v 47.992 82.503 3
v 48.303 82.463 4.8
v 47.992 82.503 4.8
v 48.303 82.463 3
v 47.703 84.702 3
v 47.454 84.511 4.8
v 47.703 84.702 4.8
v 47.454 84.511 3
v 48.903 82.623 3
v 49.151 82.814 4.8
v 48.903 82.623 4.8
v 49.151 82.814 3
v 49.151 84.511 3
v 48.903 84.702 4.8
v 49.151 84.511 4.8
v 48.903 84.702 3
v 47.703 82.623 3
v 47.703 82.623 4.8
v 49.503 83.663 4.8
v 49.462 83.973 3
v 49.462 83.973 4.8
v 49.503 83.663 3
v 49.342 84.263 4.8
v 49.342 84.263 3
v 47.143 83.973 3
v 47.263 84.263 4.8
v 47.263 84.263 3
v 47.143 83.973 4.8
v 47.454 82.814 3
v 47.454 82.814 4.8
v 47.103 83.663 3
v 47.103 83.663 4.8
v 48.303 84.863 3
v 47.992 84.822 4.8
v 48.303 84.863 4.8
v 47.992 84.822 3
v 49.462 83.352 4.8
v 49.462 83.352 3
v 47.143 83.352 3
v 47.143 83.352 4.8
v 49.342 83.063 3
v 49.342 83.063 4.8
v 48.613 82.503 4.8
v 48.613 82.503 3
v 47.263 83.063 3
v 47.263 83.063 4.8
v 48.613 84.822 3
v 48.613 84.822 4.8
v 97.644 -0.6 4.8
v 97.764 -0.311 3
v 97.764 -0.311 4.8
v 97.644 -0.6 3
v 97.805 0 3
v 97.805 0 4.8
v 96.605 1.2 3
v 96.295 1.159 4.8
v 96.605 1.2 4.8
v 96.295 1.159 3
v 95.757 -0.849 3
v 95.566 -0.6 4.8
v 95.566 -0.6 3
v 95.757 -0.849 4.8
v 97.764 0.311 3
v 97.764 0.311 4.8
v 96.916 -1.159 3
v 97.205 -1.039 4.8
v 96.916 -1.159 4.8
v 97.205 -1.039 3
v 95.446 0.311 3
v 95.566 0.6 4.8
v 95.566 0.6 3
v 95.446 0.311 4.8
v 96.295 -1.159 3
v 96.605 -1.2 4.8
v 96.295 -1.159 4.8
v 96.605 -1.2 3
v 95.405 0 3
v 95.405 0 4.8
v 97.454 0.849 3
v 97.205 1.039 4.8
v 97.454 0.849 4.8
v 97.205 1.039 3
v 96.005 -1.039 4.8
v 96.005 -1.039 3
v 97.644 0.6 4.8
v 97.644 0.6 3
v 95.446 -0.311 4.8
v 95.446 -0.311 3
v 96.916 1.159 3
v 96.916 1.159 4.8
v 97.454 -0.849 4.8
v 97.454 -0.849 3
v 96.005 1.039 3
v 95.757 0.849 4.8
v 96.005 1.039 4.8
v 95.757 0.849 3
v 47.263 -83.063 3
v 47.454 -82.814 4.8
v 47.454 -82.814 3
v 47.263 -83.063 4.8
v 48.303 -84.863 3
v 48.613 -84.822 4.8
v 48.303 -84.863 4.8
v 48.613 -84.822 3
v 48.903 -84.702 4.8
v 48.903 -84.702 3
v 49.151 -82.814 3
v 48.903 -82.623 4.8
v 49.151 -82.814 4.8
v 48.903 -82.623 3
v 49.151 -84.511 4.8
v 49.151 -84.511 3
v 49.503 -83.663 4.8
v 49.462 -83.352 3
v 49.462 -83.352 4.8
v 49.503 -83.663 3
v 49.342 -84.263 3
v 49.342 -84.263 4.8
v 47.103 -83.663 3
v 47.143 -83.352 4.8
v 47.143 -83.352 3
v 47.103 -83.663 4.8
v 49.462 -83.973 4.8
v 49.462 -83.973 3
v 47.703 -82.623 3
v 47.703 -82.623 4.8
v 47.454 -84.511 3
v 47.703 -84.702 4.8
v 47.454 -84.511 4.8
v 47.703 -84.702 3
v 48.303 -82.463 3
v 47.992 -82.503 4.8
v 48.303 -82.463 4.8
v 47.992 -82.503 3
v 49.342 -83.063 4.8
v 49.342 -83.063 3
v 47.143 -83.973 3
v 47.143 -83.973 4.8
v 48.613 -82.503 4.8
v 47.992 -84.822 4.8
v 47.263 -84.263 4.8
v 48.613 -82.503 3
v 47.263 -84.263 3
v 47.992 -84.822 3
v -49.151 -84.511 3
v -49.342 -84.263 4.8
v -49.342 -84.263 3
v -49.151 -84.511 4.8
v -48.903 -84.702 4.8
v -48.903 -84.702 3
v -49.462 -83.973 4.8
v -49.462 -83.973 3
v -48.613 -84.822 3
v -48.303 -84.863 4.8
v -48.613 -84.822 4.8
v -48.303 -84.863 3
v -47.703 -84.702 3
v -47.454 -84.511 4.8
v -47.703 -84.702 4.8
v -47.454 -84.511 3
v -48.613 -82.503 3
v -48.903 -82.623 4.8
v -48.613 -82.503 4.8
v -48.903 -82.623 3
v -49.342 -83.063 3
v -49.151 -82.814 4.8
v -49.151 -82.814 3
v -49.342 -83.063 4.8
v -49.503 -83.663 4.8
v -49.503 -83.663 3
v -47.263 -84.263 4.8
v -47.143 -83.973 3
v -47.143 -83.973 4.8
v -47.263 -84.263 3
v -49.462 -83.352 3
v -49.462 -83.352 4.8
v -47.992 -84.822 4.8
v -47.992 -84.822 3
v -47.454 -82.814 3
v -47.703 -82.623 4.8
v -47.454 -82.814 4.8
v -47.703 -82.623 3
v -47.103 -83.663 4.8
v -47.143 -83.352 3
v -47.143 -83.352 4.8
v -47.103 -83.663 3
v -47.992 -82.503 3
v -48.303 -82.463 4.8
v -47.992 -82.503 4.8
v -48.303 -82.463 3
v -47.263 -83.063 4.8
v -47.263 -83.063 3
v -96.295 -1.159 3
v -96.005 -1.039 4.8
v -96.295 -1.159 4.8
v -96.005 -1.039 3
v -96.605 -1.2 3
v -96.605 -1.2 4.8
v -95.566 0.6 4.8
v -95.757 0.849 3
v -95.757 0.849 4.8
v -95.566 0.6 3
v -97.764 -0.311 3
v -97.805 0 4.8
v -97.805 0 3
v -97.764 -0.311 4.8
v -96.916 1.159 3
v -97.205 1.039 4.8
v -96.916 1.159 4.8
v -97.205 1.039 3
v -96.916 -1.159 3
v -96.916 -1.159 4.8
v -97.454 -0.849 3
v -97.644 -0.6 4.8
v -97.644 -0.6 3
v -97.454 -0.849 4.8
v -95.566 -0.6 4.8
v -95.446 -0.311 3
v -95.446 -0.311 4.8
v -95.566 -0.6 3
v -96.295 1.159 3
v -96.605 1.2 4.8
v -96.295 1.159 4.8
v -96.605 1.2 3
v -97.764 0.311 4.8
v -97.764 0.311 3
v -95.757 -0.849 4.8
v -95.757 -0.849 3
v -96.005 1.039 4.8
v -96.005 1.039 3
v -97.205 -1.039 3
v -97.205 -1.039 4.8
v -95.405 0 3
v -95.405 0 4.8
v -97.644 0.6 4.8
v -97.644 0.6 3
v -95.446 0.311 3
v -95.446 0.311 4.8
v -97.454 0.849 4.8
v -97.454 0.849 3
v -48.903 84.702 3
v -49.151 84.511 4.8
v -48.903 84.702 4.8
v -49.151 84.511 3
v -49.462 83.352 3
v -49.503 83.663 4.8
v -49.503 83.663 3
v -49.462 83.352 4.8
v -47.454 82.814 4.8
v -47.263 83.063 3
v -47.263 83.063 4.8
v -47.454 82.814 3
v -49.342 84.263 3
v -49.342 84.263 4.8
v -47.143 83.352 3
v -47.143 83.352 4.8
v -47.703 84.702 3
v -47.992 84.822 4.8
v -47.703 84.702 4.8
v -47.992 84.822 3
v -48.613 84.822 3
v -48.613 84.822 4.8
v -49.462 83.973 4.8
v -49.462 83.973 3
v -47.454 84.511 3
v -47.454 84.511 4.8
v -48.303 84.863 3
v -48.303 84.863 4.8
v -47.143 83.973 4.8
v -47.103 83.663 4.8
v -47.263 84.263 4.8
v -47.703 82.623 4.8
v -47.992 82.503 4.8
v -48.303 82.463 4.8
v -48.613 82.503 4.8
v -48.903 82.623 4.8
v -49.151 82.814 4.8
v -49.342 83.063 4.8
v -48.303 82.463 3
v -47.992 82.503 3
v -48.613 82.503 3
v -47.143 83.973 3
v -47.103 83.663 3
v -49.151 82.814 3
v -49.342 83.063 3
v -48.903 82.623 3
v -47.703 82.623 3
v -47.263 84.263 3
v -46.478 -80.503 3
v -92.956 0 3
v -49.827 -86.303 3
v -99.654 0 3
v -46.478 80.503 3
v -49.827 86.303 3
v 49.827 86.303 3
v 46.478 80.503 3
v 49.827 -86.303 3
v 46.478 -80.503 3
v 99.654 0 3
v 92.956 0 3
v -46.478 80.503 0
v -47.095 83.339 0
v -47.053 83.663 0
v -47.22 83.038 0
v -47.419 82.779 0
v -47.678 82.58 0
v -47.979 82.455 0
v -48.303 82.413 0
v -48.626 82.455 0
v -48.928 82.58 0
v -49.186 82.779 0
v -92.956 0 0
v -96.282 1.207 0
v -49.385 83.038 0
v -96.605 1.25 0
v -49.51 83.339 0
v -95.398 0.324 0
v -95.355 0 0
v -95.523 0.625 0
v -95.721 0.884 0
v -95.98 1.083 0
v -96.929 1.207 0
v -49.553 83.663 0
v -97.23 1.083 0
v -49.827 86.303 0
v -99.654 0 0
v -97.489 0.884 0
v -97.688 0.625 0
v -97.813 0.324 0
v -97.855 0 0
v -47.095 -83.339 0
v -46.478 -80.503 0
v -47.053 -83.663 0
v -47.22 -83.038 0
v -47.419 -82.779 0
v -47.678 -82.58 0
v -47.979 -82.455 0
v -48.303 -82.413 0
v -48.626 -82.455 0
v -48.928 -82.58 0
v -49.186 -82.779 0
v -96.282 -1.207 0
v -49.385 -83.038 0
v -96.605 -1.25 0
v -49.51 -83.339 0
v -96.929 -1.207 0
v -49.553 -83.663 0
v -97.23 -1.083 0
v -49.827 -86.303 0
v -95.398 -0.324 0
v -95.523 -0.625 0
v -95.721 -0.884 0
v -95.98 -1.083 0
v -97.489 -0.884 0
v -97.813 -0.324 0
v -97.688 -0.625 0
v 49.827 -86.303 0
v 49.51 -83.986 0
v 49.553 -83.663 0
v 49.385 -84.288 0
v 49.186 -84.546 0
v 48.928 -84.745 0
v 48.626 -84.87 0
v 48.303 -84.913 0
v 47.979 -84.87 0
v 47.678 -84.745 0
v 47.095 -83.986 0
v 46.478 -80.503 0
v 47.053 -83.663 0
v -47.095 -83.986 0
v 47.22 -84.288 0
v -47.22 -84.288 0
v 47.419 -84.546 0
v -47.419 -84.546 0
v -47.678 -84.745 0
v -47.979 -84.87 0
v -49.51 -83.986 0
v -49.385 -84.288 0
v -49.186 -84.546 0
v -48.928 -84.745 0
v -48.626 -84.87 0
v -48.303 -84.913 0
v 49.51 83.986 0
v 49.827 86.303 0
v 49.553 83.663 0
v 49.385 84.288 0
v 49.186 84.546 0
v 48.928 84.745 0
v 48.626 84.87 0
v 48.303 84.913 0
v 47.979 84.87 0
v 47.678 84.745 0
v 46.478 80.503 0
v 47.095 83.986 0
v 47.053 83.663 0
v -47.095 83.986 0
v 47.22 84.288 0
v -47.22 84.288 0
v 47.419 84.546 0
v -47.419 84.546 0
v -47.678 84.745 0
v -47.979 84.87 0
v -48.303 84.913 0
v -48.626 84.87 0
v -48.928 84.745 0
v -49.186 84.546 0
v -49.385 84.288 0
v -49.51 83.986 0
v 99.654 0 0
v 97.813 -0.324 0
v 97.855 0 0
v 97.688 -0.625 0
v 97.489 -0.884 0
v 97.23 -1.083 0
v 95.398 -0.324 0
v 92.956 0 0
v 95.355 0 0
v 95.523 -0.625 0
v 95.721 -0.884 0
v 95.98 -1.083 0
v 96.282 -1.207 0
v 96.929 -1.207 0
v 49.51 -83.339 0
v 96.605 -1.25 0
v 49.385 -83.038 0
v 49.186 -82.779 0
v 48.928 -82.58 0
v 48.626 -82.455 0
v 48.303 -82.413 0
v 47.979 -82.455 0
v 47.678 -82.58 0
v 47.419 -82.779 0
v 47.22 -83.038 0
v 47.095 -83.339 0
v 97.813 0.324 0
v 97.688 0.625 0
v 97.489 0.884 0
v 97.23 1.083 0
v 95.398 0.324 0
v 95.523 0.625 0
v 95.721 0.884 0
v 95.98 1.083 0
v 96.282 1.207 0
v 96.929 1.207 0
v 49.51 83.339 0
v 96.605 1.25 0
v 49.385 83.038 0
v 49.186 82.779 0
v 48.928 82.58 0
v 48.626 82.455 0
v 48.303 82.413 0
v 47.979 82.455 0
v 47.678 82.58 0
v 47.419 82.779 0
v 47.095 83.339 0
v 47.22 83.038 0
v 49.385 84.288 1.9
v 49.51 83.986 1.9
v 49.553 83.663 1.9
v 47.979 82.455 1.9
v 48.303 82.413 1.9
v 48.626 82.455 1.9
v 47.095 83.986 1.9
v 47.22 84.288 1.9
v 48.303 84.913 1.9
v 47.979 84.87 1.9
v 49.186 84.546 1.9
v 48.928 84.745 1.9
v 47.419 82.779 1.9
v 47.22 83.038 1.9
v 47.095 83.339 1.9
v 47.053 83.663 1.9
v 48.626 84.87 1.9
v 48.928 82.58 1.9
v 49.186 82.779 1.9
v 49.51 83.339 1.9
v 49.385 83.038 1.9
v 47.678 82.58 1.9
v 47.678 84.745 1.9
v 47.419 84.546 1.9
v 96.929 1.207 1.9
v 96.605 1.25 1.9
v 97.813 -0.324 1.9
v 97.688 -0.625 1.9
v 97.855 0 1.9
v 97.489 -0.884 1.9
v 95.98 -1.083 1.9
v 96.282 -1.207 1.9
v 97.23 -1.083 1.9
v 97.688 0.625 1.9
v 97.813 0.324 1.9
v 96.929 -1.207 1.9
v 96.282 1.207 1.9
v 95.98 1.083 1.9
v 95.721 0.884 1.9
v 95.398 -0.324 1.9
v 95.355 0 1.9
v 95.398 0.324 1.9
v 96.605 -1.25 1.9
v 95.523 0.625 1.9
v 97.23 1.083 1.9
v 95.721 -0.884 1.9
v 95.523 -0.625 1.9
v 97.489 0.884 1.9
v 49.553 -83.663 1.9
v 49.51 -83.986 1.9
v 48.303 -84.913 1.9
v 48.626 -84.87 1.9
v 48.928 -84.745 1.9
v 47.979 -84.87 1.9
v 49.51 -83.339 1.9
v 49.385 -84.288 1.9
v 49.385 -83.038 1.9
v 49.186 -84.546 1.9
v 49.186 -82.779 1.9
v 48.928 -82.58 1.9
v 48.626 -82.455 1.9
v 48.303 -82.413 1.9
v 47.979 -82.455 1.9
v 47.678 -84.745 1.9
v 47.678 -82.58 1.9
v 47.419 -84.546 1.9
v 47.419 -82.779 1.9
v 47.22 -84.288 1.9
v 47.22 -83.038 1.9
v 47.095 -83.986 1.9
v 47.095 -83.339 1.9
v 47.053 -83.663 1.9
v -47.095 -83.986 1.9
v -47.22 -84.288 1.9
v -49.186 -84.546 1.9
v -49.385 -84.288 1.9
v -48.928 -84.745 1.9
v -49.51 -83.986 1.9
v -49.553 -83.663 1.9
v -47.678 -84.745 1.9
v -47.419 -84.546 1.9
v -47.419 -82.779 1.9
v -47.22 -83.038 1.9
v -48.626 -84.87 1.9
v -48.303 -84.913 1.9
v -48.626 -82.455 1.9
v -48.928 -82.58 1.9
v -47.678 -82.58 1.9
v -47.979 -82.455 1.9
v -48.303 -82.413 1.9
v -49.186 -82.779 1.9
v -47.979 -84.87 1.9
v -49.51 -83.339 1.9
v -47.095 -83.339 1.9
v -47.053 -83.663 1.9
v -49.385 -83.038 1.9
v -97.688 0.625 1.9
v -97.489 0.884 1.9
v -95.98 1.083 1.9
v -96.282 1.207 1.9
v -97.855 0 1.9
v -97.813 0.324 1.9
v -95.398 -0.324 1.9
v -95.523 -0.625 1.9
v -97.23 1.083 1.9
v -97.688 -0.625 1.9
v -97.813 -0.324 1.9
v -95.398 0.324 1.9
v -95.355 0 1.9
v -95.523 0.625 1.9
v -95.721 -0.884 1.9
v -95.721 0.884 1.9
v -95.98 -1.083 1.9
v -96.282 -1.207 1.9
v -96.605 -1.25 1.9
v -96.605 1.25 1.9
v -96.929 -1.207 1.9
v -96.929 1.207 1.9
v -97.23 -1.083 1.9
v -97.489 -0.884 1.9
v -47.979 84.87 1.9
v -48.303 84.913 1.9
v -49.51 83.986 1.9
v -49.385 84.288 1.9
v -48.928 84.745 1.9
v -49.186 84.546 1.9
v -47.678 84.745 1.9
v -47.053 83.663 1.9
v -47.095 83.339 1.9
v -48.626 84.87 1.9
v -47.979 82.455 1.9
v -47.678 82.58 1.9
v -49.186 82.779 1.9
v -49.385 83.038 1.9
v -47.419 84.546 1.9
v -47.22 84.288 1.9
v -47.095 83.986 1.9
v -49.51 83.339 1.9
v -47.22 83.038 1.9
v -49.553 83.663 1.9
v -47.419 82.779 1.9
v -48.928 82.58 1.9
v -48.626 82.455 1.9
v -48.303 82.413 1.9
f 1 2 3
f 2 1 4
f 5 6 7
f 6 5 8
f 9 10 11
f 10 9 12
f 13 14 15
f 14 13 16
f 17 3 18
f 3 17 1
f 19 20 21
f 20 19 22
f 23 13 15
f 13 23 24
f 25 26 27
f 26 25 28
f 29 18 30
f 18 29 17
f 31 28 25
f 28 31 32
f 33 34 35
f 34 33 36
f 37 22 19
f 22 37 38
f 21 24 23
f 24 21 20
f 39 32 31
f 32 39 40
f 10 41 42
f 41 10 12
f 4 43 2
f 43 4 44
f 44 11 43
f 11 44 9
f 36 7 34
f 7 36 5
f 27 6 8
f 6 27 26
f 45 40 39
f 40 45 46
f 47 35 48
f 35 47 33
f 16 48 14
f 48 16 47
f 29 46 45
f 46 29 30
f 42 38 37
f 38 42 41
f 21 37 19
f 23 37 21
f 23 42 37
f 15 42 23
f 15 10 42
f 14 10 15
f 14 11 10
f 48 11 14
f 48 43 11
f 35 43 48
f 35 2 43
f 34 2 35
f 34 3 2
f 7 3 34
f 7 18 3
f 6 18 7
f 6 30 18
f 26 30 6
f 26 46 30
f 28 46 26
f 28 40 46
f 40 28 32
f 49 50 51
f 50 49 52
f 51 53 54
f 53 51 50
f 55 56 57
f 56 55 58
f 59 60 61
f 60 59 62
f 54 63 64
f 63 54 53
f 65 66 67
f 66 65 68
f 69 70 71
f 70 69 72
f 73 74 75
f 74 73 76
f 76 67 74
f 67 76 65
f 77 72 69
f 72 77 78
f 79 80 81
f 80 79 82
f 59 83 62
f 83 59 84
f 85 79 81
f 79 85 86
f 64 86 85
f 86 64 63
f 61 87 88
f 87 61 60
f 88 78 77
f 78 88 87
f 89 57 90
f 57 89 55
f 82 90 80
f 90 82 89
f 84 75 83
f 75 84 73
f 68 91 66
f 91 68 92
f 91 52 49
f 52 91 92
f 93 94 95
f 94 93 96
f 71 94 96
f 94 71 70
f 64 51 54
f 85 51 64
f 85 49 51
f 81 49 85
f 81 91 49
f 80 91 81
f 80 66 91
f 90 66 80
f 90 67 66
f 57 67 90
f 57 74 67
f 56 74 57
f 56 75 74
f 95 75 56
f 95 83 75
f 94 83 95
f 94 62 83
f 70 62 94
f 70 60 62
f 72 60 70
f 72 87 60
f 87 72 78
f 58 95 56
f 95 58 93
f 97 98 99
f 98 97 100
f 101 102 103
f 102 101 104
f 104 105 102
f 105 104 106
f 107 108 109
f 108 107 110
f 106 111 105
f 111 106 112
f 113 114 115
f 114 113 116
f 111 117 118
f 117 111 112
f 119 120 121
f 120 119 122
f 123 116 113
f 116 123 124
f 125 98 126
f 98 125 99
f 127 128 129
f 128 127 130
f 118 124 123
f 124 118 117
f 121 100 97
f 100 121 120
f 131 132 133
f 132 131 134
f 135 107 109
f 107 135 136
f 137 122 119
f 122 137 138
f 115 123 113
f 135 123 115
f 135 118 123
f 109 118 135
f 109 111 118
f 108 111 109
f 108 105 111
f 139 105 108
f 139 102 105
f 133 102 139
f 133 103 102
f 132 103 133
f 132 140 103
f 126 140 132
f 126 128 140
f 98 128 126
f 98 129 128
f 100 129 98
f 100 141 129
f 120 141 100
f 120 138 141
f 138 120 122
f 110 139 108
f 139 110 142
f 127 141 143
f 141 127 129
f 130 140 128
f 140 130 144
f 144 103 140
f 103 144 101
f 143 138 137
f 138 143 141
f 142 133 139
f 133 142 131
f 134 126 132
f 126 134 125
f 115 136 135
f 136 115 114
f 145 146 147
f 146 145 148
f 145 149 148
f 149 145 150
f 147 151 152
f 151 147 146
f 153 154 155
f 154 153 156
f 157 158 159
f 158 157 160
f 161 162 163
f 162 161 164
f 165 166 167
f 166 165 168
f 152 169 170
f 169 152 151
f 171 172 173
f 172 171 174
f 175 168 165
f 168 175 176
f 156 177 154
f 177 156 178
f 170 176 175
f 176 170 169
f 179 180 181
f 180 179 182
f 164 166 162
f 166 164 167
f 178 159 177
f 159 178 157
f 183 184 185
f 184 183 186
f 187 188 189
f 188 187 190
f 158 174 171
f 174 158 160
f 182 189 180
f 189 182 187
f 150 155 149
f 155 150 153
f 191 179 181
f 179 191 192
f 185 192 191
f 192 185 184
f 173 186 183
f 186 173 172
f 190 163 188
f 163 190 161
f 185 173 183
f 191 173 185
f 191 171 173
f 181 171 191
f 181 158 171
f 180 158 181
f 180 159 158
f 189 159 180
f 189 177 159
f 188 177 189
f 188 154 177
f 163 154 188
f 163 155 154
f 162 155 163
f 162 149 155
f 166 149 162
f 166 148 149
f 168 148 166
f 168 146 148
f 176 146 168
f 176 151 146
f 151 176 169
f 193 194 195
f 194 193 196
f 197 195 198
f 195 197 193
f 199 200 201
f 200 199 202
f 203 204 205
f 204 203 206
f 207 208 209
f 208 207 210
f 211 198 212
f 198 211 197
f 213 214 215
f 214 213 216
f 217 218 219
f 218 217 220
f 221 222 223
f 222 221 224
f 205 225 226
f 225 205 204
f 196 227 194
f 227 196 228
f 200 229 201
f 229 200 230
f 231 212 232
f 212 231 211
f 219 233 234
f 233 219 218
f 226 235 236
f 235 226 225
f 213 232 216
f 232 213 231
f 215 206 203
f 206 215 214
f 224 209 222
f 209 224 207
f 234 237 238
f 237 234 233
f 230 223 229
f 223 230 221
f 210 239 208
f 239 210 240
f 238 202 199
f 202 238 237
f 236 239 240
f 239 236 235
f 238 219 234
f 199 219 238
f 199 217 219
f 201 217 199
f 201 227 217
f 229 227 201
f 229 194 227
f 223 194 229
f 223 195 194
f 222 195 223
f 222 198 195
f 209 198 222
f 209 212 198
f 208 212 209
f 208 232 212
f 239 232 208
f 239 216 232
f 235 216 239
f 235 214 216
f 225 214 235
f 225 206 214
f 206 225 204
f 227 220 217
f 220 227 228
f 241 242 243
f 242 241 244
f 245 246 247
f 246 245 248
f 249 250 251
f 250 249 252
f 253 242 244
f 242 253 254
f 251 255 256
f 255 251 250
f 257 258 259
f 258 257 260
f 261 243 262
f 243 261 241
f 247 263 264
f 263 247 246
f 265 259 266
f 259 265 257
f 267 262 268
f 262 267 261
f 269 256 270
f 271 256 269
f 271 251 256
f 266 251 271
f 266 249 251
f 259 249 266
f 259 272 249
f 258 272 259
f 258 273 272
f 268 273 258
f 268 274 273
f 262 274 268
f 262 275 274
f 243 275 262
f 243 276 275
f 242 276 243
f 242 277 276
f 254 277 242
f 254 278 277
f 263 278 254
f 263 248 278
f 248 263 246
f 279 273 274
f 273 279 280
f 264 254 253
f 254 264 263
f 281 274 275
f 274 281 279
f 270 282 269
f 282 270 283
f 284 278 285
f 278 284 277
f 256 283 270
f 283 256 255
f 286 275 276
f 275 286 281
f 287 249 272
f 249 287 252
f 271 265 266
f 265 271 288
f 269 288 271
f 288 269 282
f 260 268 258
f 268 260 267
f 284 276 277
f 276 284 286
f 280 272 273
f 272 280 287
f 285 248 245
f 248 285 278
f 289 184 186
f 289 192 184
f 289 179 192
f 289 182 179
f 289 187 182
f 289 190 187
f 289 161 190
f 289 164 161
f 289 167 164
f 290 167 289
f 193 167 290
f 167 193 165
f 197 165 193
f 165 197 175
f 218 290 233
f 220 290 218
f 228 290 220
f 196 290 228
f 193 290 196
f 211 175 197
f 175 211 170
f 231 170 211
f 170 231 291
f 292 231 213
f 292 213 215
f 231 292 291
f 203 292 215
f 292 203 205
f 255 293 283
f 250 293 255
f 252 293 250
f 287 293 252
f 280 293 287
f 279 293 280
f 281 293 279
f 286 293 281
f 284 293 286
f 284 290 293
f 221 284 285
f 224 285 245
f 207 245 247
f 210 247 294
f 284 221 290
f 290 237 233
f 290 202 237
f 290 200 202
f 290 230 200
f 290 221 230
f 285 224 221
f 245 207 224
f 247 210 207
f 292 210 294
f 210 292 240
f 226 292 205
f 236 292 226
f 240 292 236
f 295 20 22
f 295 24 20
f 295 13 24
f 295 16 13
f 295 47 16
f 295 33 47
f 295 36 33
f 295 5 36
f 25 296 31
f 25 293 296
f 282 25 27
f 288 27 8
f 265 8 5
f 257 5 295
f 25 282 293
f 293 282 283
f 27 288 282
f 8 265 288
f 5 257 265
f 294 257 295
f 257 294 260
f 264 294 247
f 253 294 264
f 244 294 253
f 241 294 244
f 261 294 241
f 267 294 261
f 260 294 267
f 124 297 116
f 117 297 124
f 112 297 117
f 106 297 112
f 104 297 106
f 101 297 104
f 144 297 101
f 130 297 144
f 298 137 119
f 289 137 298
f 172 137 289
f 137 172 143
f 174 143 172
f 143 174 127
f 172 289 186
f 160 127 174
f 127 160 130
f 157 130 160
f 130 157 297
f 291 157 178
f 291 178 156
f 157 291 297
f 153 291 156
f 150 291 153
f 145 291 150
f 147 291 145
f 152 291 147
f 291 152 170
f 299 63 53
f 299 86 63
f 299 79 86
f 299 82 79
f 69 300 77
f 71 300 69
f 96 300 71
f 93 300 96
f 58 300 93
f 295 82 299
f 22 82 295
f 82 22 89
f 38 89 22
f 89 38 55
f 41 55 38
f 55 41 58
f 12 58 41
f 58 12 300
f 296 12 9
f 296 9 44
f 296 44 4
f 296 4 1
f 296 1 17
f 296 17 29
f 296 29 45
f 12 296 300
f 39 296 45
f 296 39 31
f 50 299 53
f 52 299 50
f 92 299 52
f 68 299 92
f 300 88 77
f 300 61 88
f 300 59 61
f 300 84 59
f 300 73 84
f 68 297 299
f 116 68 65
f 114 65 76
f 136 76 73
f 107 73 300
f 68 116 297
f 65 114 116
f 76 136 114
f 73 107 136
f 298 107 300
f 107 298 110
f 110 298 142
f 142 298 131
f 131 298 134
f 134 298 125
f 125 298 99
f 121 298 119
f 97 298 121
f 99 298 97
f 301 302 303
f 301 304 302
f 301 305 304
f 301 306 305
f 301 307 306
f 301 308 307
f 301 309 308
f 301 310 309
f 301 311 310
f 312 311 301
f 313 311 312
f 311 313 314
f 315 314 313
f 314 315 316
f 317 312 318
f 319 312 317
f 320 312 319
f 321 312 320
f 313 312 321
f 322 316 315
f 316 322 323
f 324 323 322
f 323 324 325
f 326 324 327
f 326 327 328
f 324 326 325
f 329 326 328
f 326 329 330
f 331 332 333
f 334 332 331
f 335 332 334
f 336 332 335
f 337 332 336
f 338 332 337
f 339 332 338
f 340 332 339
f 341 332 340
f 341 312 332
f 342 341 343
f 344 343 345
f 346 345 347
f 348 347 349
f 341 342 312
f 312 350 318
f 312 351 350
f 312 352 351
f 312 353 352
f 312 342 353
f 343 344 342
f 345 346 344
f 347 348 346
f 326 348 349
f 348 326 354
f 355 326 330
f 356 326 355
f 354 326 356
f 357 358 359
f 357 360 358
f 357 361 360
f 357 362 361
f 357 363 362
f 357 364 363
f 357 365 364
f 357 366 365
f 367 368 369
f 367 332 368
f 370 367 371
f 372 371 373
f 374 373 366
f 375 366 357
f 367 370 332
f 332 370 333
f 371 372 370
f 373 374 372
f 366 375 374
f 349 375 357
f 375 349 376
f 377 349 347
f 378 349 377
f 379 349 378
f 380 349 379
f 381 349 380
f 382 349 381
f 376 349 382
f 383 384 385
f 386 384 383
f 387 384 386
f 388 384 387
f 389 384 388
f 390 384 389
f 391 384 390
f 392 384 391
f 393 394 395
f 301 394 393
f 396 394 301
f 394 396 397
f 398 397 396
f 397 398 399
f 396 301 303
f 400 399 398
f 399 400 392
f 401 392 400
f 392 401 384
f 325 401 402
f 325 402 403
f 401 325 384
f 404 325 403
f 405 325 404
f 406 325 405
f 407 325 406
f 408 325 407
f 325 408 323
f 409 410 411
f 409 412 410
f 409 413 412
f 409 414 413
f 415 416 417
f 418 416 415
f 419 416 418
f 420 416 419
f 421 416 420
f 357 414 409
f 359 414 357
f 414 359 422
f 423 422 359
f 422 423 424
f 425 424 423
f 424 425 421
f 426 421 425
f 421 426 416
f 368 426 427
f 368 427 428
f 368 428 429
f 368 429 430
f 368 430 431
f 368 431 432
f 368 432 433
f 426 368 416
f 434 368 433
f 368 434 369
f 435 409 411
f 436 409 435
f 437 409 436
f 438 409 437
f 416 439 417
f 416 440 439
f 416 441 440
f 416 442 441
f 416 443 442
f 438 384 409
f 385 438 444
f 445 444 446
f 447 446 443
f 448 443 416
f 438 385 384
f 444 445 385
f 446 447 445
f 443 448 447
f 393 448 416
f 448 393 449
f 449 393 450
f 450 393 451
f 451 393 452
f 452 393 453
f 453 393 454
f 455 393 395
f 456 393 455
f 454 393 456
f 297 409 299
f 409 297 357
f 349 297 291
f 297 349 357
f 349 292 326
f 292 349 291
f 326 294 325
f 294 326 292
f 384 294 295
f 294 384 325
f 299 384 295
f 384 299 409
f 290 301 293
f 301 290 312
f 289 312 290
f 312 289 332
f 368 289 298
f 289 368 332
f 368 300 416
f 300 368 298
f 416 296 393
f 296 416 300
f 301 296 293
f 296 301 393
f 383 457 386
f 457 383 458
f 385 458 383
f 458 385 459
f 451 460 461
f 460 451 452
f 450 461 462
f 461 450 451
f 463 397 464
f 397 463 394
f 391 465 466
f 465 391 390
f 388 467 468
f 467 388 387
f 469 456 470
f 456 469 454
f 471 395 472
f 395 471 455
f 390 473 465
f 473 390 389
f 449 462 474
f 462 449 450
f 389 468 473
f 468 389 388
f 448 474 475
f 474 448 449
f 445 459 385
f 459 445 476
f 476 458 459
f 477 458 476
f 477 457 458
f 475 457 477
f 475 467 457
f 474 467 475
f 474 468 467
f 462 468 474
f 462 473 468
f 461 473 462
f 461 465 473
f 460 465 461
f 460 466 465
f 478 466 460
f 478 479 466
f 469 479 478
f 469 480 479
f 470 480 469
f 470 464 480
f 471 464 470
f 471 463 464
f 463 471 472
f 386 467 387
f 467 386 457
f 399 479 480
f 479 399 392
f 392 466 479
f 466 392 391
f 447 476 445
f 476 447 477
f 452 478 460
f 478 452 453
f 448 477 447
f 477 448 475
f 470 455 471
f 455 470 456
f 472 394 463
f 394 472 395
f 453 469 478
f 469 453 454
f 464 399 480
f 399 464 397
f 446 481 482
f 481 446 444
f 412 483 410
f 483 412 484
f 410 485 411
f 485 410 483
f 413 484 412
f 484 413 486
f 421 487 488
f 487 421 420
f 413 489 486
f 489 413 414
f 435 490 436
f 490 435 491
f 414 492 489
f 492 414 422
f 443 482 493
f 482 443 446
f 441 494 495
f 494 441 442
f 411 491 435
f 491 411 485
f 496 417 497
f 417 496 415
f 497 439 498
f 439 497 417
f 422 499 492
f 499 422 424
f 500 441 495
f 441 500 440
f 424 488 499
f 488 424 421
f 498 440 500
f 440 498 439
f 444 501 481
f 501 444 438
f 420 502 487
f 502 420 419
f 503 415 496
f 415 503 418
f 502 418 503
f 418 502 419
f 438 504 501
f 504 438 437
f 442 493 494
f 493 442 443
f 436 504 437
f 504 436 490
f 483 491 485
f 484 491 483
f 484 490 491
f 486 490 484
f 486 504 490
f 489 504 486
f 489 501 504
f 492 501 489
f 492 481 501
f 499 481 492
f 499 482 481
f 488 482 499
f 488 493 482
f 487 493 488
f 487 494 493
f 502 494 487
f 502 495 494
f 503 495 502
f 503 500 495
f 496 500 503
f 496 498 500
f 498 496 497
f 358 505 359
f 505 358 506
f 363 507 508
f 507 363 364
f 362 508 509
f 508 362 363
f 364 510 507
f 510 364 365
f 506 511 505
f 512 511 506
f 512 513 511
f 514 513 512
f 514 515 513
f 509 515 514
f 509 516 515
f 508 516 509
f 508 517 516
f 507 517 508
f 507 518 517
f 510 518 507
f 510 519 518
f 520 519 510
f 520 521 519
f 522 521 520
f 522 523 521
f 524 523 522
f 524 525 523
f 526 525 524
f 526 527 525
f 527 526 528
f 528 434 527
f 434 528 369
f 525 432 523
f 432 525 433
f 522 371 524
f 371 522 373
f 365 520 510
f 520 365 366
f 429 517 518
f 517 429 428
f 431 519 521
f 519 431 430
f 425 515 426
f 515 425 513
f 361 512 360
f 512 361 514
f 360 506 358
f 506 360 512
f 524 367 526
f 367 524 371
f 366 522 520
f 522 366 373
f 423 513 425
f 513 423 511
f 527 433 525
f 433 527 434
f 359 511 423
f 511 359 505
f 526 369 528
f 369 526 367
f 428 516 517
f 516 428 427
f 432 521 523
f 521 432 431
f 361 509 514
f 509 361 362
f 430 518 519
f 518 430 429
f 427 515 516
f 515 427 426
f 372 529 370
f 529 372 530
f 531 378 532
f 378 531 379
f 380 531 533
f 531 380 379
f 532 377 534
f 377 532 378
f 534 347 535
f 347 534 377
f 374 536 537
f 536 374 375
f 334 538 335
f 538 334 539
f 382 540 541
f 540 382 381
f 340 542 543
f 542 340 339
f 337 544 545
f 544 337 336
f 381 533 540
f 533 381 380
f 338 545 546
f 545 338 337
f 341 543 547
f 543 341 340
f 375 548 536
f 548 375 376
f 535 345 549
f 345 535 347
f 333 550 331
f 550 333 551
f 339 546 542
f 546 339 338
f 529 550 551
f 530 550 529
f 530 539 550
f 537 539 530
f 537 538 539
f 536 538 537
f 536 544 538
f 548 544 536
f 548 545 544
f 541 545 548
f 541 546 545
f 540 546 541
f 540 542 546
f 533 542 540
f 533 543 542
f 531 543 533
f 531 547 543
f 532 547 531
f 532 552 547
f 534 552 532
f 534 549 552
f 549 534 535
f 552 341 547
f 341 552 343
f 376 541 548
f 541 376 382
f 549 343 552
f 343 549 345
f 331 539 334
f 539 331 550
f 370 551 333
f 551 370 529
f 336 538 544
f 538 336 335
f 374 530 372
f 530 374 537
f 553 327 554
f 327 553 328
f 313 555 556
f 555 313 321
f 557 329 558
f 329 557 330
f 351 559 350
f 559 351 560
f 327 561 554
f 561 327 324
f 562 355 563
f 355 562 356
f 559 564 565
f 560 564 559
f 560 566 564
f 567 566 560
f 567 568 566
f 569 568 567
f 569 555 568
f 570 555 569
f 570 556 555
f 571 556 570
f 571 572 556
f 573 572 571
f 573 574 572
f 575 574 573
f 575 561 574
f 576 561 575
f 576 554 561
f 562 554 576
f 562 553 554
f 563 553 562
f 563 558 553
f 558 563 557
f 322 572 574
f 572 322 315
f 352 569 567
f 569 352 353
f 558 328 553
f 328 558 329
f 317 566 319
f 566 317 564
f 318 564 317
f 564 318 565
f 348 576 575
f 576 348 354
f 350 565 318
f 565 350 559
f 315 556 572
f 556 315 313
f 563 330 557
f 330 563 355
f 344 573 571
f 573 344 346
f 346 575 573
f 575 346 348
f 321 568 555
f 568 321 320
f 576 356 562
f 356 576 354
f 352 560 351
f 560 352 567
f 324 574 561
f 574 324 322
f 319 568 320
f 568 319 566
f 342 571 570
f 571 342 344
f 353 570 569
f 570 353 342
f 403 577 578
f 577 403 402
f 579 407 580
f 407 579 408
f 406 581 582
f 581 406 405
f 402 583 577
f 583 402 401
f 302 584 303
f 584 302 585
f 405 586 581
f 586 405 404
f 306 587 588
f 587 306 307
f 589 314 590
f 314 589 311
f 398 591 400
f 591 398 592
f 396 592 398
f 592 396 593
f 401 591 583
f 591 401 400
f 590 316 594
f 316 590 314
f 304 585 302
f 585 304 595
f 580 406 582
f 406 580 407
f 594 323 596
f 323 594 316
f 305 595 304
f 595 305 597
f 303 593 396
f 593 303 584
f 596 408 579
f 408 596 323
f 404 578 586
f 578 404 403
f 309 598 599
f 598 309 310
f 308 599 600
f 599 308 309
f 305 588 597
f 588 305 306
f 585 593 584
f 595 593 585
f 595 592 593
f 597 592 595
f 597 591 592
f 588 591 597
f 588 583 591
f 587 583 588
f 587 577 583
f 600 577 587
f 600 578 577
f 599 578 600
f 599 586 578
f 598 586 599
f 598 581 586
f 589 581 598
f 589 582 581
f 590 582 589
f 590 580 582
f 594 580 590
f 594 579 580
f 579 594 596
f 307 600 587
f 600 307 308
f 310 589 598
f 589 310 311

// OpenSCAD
// file: common.scad
// =====================================================================
//  common.scad -- helpers and mock PCBs shared by the WP 1.6 part files.
//  Part files `include <common.scad>` (this pulls in params.scad too).
// =====================================================================
include <params.scad>

// ---------------- polygon helpers ----------------
function circ(a) = a / cos(180 / n_sides);                 // apothem -> circumradius
module ngon(a) rotate(pr_rot) circle(r = circ(a), $fn = n_sides);

// Polygon ring between apothems a0 and a1, from z0 to z1.
module ring_band(a0, a1, z0, z1)
    translate([0, 0, z0]) linear_extrude(z1 - z0) difference() { ngon(a1); if (a0 > 0) ngon(a0); }

module on_sides(list) for (k = list) rotate([0, 0, k * 360 / n_sides]) children();
module all_sides() on_sides([0 : n_sides - 1]) children();

// +X points at corner k (between side k and side k+1).
module at_corners() for (k = [0 : n_sides - 1]) rotate([0, 0, -90 + 180 / n_sides + k * 360 / n_sides]) children();

// Box in side-local coordinates: X along the side, r = apothem (r grows toward -Y), z.
module sbox(x0, x1, r0, r1, z0, z1) translate([x0, -r1, z0]) cube([x1 - x0, r1 - r0, z1 - z0]);

// Prism with a cross-section given as [r, z] points, running X = x0..x1 (side-local).
module rz_prism(x0, x1, pts)
    translate([x0, 0, 0]) rotate([90, 0, 90]) linear_extrude(x1 - x0) polygon([for (p = pts) [-p[0], p[1]]]);

// Controller trapezoid (side-0 local, 2D). y_ext extends the base past the board face.
// y = distance from the code-0 inward face toward the panel centre.
function ctrl_hw(y) = ctrl_base / 2 - (y - ctrl_gap) * tan(90 - ctrl_side);
module ctrl_2d(y_ext = 0) {
    y0 = ctrl_gap - y_ext;
    y1 = ctrl_gap + ctrl_depth;
    polygon([[-ctrl_hw(y0), -Ai + y0], [ctrl_hw(y0), -Ai + y0],
             [ctrl_hw(y1), -Ai + y1], [-ctrl_hw(y1), -Ai + y1]]);
}

// ---------------- controller edges in the CONTROLLER frame (LAYOUT-NOTES §1) ----------------
// Frame: x to the right and y into the board, seen from F.Cu (the wall side); base edge at y = ctrl_gap.
// Global: X = -x, Y = -Ai + y. Edges run in the notes' order: 0 base (from the left corner),
// 1 right side (from the base corner), 2 top (from the right corner), 3 left side (from the top corner).
ctrl_top_hw = ctrl_base / 2 - ctrl_depth * tan(90 - ctrl_side);
ctrl_c = [[-ctrl_base / 2, ctrl_gap], [ctrl_base / 2, ctrl_gap],
          [ctrl_top_hw, ctrl_gap + ctrl_depth], [-ctrl_top_hw, ctrl_gap + ctrl_depth]];
function ctrl_dir(i) = let(a = ctrl_c[i], b = ctrl_c[(i + 1) % 4], d = b - a) d / norm(d);
function ctrl_nrm(i) = let(d = ctrl_dir(i)) [d[1], -d[0]];          // outward normal
function ctrl_pt(i, s) = ctrl_c[i] + s * ctrl_dir(i);
function to_glob(p) = [-p[0], -Ai + p[1]];
function nrm_glob(n) = [-n[0], n[1]];

// 2D strip along edge i, s0..s1, from `outw` outside the edge to `inw` inside it (global coordinates).
module ctrl_edge_strip(i, s0, s1, outw, inw) {
    n = ctrl_nrm(i);
    polygon([to_glob(ctrl_pt(i, s0) + outw * n), to_glob(ctrl_pt(i, s1) + outw * n),
             to_glob(ctrl_pt(i, s1) - inw * n), to_glob(ctrl_pt(i, s0) - inw * n)]);
}

// Place children at s along edge i, local +Y = outward normal, origin on the edge offset by `off`.
module at_ctrl_edge(i, s, off = 0) {
    n = ctrl_nrm(i);
    ng = nrm_glob(n);
    translate(to_glob(ctrl_pt(i, s) + off * n)) rotate(atan2(ng[1], ng[0]) - 90) children();
}

// ---------------- mock PCBs (assembly only, never printed) ----------------
// One edge board in side-local position. Board x = -X (see params.scad header).
module mock_edge_board(code0 = false) {
    color("darkgreen") sbox(-HL, HL, Ai, Ae, 0, board_H);
    // exterior contact pads (B.Cu, gold)
    color("gold") for (x = pad_x) sbox(-x - 1.5, -x + 1.5, Ae, Ae + 0.05, 0.6, strip_top);
    // exterior corner power pads
    color("gold") for (s = [-1, 1]) for (zz = [[0.5, 3.5], [6.0, 8.5], [11.0, 12.6]])
        sbox(s > 0 ? HL - corner_pad_ex_w : -HL, s > 0 ? HL : -HL + corner_pad_ex_w, Ae, Ae + 0.05, zz[0], zz[1]);
    // LEDs on the inward face
    for (x = led_x) color("white")
        sbox(-x - led_size / 2, -x + led_size / 2, Ai - led_proud, Ai, led_z - led_size / 2, led_z + led_size / 2);
    // J4 joint pads (inward face, every board)
    color(code0 ? "gold" : "goldenrod") for (i = [0:9])
        sbox(-(-11.43 + 2.54 * i) - 0.65, -(-11.43 + 2.54 * i) + 0.65, Ai - 0.05, Ai, j4_z[0], j4_z[1]);
    // inward corner signal pads
    color("goldenrod") for (s = [-1, 1])
        sbox(s > 0 ? HL - corner_pad_in_w : -HL, s > 0 ? HL : -HL + corner_pad_in_w, Ai - 0.05, Ai, 0.85, 12.15);
}

module mock_boards() for (k = [0 : n_sides - 1]) rotate([0, 0, k * 360 / n_sides]) mock_edge_board(k == 0);

// Controller board at its rev A position (parts on the wall side). Mirror: controller x (seen from F.Cu) = -X.
module mock_controller() {
    color("white") translate([0, 0, z_ctrl_bot]) linear_extrude(ctrl_t)
        offset(r = ctrl_fillet) offset(delta = -ctrl_fillet) ctrl_2d();
    // L1 inductor, the tallest part (4.5 mm), hanging toward the wall
    color("dimgray") translate([-ctrl_L1[0] - ctrl_L1[2] / 2, -Ai + ctrl_gap + ctrl_L1[1] - ctrl_L1[3] / 2, z_ctrl_bot - ctrl_L1[4]])
        cube([ctrl_L1[2], ctrl_L1[3], ctrl_L1[4]]);
    // joint fillet zone
    color("silver") translate([-12.33, -Ai, z_ctrl_bot - 1.5]) cube([24.66, 2.0, 1.5]);
}

// Seam bridge in side-local position: PCB centred on the seam line r = As, springs on both faces.
module mock_bridge() {
    color("darkolivegreen") sbox(-bridge_len / 2, bridge_len / 2, As - bridge_t / 2, As + bridge_t / 2, bridge_z_bot, bridge_z_top);
    sh = spring_h_at_d;
    color("silver") for (x = pad_x) for (s = [-1, 1])
        sbox(x - spring_w / 2, x + spring_w / 2,
             s < 0 ? As - bridge_t / 2 - sh : As + bridge_t / 2,
             s < 0 ? As - bridge_t / 2 : As + bridge_t / 2 + sh,
             spring_contact_z - 0.9, spring_contact_z + 2.6);
}

// Diffuser film (cut template shape), 2D.
module film_2d() intersection() {
    ngon(film_a);
    // half-planes x' <= film_cr at every corner (corners cut clear of the registration pins)
    intersection_for (k = [0 : n_sides - 1])
        rotate(-90 + 180 / n_sides + k * 360 / n_sides) translate([film_cr - 400, -200]) square([400, 400]);
}
// main file
// =====================================================================
//  diffuser.scad -- WP 1.6 diffuser retention with adjustable height, white PETG.
//
//  The film lies flat on the frame cap (no riser) or on a riser ring, and a bezel ring clamps
//  it. Risers and the bezel register on corner pins (press fit into the holes in the part
//  below); the film's corners are cut off so the pins pass outside it (no holes in the film).
//
//  Film height above the board top = 0.15 groove + 2.0 cap + riser:
//      riser 0 -> 2.15 mm,  3 -> 5.15 mm,  6 -> 8.15 mm,  10 -> 12.15 mm
//  The risers continue the chamber wall in line with the frame lip (white, reflective).
//
//  Parts (each printed top face down, pins up, no supports):
//      riser_3 / riser_6 / riser_10, bezel, and a 2D cut template for the film (DXF/SVG).
//  Export:
//      openscad.com -o stl/riser_3.stl  -D "part=\"riser\"" -D riser_h=3  diffuser.scad
//      openscad.com -o stl/bezel.stl    -D "part=\"bezel\""               diffuser.scad
//      openscad.com -o film_template.dxf -D "part=\"film\""                diffuser.scad
// =====================================================================
include <common.scad>

part = "riser";      // riser | bezel | film | assembly
riser_h = 3;

module corner_pins() at_corners() translate([pin_cr, 0, -pin_h]) {
    cylinder(d = pin_d, h = pin_h + eps, $fn = 24);
}
module corner_pin_holes(h) at_corners() translate([pin_cr, 0, h - pin_hole_h]) cylinder(d = pin_hole_d, h = pin_hole_h + 1, $fn = 24);

// Riser ring, bottom at z 0 (sits on the frame cap).
module riser(h = riser_h) {
    assert(h >= pin_hole_h + 1.0, "riser too thin for the pin holes");
    difference() {
        union() { ring_band(Ai - lip_w, Ao, 0, h); corner_pins(); }
        corner_pin_holes(h);
    }
}

// Bezel ring, bottom at z 0 (rests on the film).
module bezel() union() { ring_band(Ai - lip_w, Ao, 0, bezel_t); corner_pins(); }

module film() color("lightblue", 0.45) linear_extrude(film_t) film_2d();

// Diffuser stack in panel position, riser h (0 = none).
module diffuser_stack(h = 3, explode = 0) {
    z0 = z_cap_top;
    if (h > 0) translate([0, 0, z0 + explode]) color("whitesmoke") riser(h);
    translate([0, 0, z0 + h + 2 * explode]) film();
    translate([0, 0, z0 + h + film_t + 3 * explode]) color("gainsboro") bezel();
}

module print_flip(h) translate([0, 0, h]) rotate([180, 0, 0]) children();

if (part == "riser") print_flip(riser_h) riser(riser_h);
else if (part == "bezel") print_flip(bezel_t) bezel();
else if (part == "film") film_2d();
else if (part == "assembly") diffuser_stack(riser_h);
